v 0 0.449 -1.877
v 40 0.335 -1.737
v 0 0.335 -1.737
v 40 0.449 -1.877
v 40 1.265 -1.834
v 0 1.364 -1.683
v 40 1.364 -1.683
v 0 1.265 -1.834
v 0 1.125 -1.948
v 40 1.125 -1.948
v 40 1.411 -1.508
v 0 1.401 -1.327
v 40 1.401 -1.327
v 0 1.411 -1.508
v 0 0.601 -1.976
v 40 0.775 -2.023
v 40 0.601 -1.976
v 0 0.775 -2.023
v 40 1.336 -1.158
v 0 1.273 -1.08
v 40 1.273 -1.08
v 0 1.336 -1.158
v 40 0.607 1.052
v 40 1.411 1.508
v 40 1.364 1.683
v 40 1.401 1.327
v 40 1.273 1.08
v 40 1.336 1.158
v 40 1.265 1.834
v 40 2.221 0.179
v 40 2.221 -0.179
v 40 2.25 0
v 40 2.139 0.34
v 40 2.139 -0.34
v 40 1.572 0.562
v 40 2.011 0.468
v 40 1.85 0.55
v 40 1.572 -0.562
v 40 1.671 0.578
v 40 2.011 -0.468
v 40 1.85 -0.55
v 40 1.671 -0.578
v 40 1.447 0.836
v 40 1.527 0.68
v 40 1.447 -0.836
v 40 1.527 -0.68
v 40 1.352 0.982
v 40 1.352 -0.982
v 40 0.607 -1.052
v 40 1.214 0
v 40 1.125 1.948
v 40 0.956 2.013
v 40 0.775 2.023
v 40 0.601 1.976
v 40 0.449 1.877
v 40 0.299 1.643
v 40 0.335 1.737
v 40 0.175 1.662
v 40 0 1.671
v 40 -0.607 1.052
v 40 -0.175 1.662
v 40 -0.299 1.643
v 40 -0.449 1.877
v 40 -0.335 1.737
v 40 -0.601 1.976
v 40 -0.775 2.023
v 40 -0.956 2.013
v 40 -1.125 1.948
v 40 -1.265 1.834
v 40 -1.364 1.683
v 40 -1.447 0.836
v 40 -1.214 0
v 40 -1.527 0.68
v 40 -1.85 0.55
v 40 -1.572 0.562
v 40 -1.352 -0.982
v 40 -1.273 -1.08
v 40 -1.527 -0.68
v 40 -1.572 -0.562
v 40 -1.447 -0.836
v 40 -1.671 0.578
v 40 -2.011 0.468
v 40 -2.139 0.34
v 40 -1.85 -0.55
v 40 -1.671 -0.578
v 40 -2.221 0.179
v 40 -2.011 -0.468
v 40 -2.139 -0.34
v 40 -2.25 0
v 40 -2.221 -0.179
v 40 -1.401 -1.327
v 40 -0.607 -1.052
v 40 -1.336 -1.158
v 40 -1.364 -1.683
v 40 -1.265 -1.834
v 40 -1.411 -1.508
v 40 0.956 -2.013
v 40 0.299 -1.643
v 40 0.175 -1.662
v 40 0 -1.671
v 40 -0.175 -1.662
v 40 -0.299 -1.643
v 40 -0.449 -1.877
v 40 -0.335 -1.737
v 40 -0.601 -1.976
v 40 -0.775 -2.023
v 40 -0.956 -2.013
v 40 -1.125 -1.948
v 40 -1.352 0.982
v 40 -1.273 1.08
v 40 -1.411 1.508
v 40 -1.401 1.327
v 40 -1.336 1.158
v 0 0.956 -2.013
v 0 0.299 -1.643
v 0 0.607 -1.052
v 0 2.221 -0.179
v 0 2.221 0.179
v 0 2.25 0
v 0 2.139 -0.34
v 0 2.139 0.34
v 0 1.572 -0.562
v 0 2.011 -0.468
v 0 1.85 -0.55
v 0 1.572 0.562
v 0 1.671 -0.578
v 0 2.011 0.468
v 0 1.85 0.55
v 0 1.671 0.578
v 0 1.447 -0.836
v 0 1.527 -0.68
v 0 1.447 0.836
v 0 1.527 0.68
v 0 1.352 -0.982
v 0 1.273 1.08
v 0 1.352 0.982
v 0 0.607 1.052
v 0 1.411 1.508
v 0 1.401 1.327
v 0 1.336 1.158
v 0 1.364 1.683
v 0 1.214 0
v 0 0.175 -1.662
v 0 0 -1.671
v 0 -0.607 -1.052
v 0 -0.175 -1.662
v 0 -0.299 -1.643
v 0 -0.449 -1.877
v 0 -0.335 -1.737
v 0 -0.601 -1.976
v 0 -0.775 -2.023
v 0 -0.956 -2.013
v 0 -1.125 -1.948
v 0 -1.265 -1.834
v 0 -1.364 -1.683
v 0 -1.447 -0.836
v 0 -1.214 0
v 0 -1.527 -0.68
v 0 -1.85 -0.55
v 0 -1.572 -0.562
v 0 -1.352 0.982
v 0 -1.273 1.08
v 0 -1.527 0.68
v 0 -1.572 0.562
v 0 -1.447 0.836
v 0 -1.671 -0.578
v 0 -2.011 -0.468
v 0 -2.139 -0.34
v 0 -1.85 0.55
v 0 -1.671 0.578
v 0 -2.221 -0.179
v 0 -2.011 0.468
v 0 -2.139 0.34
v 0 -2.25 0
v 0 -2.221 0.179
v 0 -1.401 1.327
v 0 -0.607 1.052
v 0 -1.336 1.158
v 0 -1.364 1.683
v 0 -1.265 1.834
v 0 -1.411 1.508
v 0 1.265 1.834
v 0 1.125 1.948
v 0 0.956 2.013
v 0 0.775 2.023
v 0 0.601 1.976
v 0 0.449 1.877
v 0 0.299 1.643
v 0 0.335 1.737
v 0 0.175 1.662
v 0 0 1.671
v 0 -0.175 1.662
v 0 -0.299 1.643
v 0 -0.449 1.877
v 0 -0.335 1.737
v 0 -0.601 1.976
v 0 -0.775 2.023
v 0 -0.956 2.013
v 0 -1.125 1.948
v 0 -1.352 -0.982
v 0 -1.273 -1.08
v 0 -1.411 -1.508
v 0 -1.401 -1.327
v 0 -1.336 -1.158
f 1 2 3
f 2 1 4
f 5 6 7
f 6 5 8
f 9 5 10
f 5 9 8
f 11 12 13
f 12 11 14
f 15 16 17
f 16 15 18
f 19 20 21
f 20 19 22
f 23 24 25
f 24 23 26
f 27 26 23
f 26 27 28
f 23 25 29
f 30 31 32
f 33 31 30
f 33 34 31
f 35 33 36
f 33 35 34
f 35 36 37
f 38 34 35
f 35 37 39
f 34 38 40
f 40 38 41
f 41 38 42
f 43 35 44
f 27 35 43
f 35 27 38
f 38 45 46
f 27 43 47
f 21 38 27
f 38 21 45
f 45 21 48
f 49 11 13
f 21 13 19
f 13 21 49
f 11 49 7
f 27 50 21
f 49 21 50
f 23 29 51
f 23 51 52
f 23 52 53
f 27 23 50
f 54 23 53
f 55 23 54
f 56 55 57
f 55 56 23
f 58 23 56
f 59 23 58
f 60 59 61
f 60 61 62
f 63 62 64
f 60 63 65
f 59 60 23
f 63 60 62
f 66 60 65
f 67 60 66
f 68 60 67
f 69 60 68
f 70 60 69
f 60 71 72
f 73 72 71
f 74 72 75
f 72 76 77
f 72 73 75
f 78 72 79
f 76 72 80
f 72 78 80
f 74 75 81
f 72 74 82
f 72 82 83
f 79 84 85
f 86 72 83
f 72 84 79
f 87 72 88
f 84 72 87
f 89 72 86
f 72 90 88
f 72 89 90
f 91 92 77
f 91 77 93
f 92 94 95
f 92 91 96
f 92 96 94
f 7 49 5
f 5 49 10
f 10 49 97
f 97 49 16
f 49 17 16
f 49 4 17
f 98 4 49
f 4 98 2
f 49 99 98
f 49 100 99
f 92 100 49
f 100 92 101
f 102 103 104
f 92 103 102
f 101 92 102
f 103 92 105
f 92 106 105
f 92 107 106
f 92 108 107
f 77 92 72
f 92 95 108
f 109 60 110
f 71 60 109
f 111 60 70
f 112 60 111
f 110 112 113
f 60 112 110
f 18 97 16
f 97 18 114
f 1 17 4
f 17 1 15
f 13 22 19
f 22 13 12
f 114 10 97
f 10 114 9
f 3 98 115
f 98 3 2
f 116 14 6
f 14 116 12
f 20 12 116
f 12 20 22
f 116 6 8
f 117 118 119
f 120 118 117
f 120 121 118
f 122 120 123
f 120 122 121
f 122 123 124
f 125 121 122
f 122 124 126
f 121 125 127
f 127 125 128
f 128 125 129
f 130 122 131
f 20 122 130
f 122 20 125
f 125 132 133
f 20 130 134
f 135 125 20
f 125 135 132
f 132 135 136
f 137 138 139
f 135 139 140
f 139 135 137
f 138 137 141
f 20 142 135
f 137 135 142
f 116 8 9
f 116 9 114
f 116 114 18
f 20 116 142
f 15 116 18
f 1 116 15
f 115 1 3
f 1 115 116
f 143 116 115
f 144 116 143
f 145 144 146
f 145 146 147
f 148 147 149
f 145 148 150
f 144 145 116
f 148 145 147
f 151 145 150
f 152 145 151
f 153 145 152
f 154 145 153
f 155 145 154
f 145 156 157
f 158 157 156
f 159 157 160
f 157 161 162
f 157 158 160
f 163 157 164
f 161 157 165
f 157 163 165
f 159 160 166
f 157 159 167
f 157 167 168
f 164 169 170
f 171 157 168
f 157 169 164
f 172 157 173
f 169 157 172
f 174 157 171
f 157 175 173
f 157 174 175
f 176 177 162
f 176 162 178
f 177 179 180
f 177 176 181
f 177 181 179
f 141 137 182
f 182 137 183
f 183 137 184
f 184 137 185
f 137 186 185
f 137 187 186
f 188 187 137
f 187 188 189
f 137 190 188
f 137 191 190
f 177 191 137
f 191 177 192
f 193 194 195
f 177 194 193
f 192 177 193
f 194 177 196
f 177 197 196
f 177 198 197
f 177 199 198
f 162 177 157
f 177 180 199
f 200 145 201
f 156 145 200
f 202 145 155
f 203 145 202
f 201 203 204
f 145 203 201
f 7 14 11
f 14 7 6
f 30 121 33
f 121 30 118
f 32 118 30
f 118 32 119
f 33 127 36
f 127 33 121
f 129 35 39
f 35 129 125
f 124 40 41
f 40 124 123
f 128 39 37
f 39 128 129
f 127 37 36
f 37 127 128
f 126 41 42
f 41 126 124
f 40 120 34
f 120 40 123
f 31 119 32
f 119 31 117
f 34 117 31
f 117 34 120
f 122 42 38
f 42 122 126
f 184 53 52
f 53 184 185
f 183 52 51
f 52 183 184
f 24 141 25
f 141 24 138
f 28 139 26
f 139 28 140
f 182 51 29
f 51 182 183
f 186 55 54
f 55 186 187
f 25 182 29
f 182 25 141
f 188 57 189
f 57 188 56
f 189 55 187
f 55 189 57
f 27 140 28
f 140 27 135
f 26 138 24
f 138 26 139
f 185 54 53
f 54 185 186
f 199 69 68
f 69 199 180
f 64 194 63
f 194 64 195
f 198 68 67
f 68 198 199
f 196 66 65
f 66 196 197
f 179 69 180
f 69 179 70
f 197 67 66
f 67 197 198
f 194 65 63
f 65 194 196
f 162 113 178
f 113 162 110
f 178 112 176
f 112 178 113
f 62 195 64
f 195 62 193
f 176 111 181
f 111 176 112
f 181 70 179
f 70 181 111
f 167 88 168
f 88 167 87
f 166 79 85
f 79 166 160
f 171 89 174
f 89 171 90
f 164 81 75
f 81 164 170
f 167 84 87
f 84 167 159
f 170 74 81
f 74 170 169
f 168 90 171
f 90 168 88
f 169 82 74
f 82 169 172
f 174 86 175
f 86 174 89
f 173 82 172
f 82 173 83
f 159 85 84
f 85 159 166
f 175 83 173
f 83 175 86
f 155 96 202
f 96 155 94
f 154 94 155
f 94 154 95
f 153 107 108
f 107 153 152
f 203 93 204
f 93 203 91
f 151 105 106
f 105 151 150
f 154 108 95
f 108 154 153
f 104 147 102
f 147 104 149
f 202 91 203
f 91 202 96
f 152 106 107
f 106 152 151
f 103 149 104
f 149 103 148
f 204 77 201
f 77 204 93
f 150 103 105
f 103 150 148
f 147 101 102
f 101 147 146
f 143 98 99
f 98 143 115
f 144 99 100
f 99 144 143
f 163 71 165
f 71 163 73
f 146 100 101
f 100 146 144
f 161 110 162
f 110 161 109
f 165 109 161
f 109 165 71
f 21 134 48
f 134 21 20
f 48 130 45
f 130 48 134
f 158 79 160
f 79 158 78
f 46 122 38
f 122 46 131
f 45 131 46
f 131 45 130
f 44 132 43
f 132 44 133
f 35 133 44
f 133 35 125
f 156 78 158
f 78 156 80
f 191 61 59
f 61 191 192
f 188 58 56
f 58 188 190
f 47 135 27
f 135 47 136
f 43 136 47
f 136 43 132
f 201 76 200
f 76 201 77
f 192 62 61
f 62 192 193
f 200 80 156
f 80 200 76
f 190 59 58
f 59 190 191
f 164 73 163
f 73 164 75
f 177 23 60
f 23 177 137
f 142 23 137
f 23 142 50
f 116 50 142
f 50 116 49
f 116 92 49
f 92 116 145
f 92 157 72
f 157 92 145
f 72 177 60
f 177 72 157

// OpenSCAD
// 'Ultimate Nut Knob Generator' by wstein 
// is licensed under the Attribution - Non-Commercial - Share Alike license. 
// Version 1.5 (c) April 2015
// please refer the complete license here: http://creativecommons.org/licenses/by-nc-sa/3.0/legalcoe
//
// V1.1: some smaller improvements and new parameter "supportless_friendly" and "screw_hole_length"
// V1.2: flip very long knobs (miniature hex handle) and new hex shape
// V1.5: new support of tetragon up to octagon nuts
//       new wing shape
//       error in calulation of nuts fixed (relevant on bigger ones)

// preview[view:north, tilt:top diagonal]

//across flats (wrench size) M3 = 5.42
// 3/32 inch = 2.13 mm
// 5/64 inch = 1.93 mm
nut_width = 1.93;

//of knob (at least nuts height + 1mm)
height=40.0;

// calculated relative to hex nut diameter (100% is the minimal nut surrounding circle)
diameter_1=150; //[100:300]
function get_diameter_1()=nut_diameter*diameter_1/100;

// should be multiple of layer thickness (0.6 should be perfect for 0.1, 0.2, 0.3mm layer thickness). Use 0 for open bottom.
bottom_thickness = 0;

/*[Advanced]*/
echo("nut_diameter",nut_diameter);

// in percent of Diameter 1 
diameter_2=100; //[100:200]
function get_diameter_2()=get_diameter_1()*diameter_2/100;

// in percent of nut diameter (Nut Width * 1.118)
screw_hole_diameter = 0; //[0:100]
function get_screw_hole_diameter()=nut_diameter*screw_hole_diameter/100;

// in percent of knob height
screw_hole_length = 100; //[0:100]
function get_screw_hole_length()=height*screw_hole_length/100;

//big number is ok for this application. no need to change
nut_thickness = 1000.0;

// in percent of knob height (shold be 100%)
knurled_height=100; //[10:100]

/*[Knurled]*/

knurled_density=50; //[0:100]

knurled_strong=4;//[1:20]

/*[Expert]*/
//- tetragon=4, pentagon=5, hexagon=6, octagon=8
nut_sides=6;//[4,5,6,8]

// prevented some extreme overhangs
supportless_friendly=1; //[0:false,1:true]

backlash=0.1;

cross_section=0; //[0:false,1:true]

/*[Global]*/

// style (best use simple or cylindrical for preview, finally all shapes are created)
part = "cylindrical"; // [hex,simple,cylindrical,clamp,rounded,wing]

/*[Hidden]*/
function get_knurled_n()= (
    part=="hex" ? 6 : (
    part=="wing" ? 2 : (
    round(sqrt(10*get_diameter_2())*get_knurled_density_factor()))));
    
function get_knurled_density_factor()=pow(10,knurled_density/50-1);
echo("get_knurled_density_factor()", get_knurled_density_factor());

nut_diameter = nut_width/cos(360/nut_sides/2);
nut_diameter = nut_width/cos(360/6/2);

knurled_r=sqrt(10*get_diameter_2())/40*knurled_strong;

h1=height-height*knurled_height/100;
hlist=[0,h1/5,h1*2/5,h1*3/5,h1*4/5,h1,height];
rstep=[0,pow(0.2,2),pow(0.4,2),pow(0.6,2),pow(0.8,2),pow(1.0,2),pow(1.0,2)];
rlist=rstep*(get_diameter_2()-get_diameter_1());

if(height-h1-2.1*knurled_r>0||part!="rounded")
rotate(nut_width*5<height?[0,90,0]:(bottom_thickness==0.0?[180,0,0]:[0,0,0]))
union()
{
	difference()
	{
		union()
		{
			create_knurled();
	
			for(n=[0:5])
			translate([0,0,hlist[n]])
			cylinder(r1=(get_diameter_1()+rlist[n])/2,r2=(get_diameter_1()+rlist[n+1])/2,h=hlist[n+1]-hlist[n],$fn=60);
		}
	
		if(get_screw_hole_diameter()>0&&screw_hole_length>0)
		translate([0,0,-.1])
		cylinder(r=get_screw_hole_diameter()/2+backlash,h=get_screw_hole_length()+.11,$fn=20);

		assign(r1=1.0*nut_diameter/2+backlash)
		assign(r2=0.95*nut_diameter/2+backlash)
		assign(r3=1.05*nut_diameter/2+backlash)
		assign(h1=bottom_thickness)
		assign(h2=h1+nut_thickness-0.04*nut_diameter)
		assign(h3=h1+nut_thickness-0.01*nut_diameter)
		assign(h30=h1+nut_thickness)
		assign(h4=h1+nut_thickness+.1*nut_diameter)
		assign(h5=h4+.2*nut_diameter)
		assign(h6=max(h5,height))
        rotate([0,0,360/nut_sides/2])
		rotate_extrude($fn=nut_sides)
		if(bottom_thickness>0)
		polygon(points=[[r1,h1],[r1,h2],[r2,h3],[r2,h4],[r3,h5],[r3,h6+.1],[0,h6+.1],[0,h1]]);
		else
		polygon(points=[[r1,h1-.1],[r1,h30],[0,h30],[0,h1]]);
	
		if(cross_section)
		translate([-1000/2,0,-.1])
		cube([1000,1000,100]);
	}

}
else
for(a=[-45,45])
rotate([0,0,a])
cube([1,10,0.2],center=true);

module create_knurled()
translate([0,0,h1])
difference()
{
	if(part=="simple")
	create_simple_knurled();
	else if(part=="hex")
    hull()
	create_shaped_knurled();
	else if(part=="clamp")
	create_knurled_clamp();
    else if(part=="wing")
    create_wings();
	else
	create_shaped_knurled();

	assign(points=[[get_diameter_2()/2,-.01],[get_diameter_2()/2+1000,1000/2],[get_diameter_2()/2+1000,-.01]])
	if(part!="rounded"&&bottom_thickness!=0.0&&supportless_friendly==1)
	rotate_extrude($fn=60)
	polygon(points);
}

module create_knurled_clamp()
difference()
{
	cylinder(r=(2*knurled_r+get_diameter_2())/2,h=height-h1,$fn=60);

	for(a=[0:get_knurled_n()-1])
	rotate(360/get_knurled_n()*a)
	translate([get_diameter_2()/2+knurled_r,0,-.1])
	cylinder(r=knurled_r,h=height-h1+.2,$fn=30);
}

module create_simple_knurled(fn=4)
assign(n=round(get_knurled_n()/2))
for(a=[0:n-1])
rotate(360/fn/n*(a+.5))
cylinder(r=(2*knurled_r+get_diameter_2())/2,h=height-h1,$fn=fn);

module create_shaped_knurled()
for(a=[0:get_knurled_n()-1])
rotate(360/get_knurled_n()*(a+.5))
translate([get_diameter_2()/2,0,0])
if(part=="rounded"||part=="hex")
hull()
create_knurled_rounded();
else if(part=="cylindrical")
create_knurled_cylindrical();

module create_knurled_rounded()
for(z=[knurled_r,height-h1-knurled_r])
translate([0,0,z])
sphere(r=knurled_r,$fn=20);

module create_knurled_cylindrical()
cylinder(r=knurled_r,h=height-h1,$fn=20);

module create_wings()
assign(len=knurled_r*get_diameter_2()*.7)
linear_extrude(height=height-h1,convexity=20)
hull()
{
    circle(r=get_diameter_2()/2,$fn=60);
        
    for(a=[0:1])
    rotate(360/get_knurled_n()*(a+.5))
    translate([len,0,0])
    circle(r=get_diameter_2()/4,$fn=30);
}
